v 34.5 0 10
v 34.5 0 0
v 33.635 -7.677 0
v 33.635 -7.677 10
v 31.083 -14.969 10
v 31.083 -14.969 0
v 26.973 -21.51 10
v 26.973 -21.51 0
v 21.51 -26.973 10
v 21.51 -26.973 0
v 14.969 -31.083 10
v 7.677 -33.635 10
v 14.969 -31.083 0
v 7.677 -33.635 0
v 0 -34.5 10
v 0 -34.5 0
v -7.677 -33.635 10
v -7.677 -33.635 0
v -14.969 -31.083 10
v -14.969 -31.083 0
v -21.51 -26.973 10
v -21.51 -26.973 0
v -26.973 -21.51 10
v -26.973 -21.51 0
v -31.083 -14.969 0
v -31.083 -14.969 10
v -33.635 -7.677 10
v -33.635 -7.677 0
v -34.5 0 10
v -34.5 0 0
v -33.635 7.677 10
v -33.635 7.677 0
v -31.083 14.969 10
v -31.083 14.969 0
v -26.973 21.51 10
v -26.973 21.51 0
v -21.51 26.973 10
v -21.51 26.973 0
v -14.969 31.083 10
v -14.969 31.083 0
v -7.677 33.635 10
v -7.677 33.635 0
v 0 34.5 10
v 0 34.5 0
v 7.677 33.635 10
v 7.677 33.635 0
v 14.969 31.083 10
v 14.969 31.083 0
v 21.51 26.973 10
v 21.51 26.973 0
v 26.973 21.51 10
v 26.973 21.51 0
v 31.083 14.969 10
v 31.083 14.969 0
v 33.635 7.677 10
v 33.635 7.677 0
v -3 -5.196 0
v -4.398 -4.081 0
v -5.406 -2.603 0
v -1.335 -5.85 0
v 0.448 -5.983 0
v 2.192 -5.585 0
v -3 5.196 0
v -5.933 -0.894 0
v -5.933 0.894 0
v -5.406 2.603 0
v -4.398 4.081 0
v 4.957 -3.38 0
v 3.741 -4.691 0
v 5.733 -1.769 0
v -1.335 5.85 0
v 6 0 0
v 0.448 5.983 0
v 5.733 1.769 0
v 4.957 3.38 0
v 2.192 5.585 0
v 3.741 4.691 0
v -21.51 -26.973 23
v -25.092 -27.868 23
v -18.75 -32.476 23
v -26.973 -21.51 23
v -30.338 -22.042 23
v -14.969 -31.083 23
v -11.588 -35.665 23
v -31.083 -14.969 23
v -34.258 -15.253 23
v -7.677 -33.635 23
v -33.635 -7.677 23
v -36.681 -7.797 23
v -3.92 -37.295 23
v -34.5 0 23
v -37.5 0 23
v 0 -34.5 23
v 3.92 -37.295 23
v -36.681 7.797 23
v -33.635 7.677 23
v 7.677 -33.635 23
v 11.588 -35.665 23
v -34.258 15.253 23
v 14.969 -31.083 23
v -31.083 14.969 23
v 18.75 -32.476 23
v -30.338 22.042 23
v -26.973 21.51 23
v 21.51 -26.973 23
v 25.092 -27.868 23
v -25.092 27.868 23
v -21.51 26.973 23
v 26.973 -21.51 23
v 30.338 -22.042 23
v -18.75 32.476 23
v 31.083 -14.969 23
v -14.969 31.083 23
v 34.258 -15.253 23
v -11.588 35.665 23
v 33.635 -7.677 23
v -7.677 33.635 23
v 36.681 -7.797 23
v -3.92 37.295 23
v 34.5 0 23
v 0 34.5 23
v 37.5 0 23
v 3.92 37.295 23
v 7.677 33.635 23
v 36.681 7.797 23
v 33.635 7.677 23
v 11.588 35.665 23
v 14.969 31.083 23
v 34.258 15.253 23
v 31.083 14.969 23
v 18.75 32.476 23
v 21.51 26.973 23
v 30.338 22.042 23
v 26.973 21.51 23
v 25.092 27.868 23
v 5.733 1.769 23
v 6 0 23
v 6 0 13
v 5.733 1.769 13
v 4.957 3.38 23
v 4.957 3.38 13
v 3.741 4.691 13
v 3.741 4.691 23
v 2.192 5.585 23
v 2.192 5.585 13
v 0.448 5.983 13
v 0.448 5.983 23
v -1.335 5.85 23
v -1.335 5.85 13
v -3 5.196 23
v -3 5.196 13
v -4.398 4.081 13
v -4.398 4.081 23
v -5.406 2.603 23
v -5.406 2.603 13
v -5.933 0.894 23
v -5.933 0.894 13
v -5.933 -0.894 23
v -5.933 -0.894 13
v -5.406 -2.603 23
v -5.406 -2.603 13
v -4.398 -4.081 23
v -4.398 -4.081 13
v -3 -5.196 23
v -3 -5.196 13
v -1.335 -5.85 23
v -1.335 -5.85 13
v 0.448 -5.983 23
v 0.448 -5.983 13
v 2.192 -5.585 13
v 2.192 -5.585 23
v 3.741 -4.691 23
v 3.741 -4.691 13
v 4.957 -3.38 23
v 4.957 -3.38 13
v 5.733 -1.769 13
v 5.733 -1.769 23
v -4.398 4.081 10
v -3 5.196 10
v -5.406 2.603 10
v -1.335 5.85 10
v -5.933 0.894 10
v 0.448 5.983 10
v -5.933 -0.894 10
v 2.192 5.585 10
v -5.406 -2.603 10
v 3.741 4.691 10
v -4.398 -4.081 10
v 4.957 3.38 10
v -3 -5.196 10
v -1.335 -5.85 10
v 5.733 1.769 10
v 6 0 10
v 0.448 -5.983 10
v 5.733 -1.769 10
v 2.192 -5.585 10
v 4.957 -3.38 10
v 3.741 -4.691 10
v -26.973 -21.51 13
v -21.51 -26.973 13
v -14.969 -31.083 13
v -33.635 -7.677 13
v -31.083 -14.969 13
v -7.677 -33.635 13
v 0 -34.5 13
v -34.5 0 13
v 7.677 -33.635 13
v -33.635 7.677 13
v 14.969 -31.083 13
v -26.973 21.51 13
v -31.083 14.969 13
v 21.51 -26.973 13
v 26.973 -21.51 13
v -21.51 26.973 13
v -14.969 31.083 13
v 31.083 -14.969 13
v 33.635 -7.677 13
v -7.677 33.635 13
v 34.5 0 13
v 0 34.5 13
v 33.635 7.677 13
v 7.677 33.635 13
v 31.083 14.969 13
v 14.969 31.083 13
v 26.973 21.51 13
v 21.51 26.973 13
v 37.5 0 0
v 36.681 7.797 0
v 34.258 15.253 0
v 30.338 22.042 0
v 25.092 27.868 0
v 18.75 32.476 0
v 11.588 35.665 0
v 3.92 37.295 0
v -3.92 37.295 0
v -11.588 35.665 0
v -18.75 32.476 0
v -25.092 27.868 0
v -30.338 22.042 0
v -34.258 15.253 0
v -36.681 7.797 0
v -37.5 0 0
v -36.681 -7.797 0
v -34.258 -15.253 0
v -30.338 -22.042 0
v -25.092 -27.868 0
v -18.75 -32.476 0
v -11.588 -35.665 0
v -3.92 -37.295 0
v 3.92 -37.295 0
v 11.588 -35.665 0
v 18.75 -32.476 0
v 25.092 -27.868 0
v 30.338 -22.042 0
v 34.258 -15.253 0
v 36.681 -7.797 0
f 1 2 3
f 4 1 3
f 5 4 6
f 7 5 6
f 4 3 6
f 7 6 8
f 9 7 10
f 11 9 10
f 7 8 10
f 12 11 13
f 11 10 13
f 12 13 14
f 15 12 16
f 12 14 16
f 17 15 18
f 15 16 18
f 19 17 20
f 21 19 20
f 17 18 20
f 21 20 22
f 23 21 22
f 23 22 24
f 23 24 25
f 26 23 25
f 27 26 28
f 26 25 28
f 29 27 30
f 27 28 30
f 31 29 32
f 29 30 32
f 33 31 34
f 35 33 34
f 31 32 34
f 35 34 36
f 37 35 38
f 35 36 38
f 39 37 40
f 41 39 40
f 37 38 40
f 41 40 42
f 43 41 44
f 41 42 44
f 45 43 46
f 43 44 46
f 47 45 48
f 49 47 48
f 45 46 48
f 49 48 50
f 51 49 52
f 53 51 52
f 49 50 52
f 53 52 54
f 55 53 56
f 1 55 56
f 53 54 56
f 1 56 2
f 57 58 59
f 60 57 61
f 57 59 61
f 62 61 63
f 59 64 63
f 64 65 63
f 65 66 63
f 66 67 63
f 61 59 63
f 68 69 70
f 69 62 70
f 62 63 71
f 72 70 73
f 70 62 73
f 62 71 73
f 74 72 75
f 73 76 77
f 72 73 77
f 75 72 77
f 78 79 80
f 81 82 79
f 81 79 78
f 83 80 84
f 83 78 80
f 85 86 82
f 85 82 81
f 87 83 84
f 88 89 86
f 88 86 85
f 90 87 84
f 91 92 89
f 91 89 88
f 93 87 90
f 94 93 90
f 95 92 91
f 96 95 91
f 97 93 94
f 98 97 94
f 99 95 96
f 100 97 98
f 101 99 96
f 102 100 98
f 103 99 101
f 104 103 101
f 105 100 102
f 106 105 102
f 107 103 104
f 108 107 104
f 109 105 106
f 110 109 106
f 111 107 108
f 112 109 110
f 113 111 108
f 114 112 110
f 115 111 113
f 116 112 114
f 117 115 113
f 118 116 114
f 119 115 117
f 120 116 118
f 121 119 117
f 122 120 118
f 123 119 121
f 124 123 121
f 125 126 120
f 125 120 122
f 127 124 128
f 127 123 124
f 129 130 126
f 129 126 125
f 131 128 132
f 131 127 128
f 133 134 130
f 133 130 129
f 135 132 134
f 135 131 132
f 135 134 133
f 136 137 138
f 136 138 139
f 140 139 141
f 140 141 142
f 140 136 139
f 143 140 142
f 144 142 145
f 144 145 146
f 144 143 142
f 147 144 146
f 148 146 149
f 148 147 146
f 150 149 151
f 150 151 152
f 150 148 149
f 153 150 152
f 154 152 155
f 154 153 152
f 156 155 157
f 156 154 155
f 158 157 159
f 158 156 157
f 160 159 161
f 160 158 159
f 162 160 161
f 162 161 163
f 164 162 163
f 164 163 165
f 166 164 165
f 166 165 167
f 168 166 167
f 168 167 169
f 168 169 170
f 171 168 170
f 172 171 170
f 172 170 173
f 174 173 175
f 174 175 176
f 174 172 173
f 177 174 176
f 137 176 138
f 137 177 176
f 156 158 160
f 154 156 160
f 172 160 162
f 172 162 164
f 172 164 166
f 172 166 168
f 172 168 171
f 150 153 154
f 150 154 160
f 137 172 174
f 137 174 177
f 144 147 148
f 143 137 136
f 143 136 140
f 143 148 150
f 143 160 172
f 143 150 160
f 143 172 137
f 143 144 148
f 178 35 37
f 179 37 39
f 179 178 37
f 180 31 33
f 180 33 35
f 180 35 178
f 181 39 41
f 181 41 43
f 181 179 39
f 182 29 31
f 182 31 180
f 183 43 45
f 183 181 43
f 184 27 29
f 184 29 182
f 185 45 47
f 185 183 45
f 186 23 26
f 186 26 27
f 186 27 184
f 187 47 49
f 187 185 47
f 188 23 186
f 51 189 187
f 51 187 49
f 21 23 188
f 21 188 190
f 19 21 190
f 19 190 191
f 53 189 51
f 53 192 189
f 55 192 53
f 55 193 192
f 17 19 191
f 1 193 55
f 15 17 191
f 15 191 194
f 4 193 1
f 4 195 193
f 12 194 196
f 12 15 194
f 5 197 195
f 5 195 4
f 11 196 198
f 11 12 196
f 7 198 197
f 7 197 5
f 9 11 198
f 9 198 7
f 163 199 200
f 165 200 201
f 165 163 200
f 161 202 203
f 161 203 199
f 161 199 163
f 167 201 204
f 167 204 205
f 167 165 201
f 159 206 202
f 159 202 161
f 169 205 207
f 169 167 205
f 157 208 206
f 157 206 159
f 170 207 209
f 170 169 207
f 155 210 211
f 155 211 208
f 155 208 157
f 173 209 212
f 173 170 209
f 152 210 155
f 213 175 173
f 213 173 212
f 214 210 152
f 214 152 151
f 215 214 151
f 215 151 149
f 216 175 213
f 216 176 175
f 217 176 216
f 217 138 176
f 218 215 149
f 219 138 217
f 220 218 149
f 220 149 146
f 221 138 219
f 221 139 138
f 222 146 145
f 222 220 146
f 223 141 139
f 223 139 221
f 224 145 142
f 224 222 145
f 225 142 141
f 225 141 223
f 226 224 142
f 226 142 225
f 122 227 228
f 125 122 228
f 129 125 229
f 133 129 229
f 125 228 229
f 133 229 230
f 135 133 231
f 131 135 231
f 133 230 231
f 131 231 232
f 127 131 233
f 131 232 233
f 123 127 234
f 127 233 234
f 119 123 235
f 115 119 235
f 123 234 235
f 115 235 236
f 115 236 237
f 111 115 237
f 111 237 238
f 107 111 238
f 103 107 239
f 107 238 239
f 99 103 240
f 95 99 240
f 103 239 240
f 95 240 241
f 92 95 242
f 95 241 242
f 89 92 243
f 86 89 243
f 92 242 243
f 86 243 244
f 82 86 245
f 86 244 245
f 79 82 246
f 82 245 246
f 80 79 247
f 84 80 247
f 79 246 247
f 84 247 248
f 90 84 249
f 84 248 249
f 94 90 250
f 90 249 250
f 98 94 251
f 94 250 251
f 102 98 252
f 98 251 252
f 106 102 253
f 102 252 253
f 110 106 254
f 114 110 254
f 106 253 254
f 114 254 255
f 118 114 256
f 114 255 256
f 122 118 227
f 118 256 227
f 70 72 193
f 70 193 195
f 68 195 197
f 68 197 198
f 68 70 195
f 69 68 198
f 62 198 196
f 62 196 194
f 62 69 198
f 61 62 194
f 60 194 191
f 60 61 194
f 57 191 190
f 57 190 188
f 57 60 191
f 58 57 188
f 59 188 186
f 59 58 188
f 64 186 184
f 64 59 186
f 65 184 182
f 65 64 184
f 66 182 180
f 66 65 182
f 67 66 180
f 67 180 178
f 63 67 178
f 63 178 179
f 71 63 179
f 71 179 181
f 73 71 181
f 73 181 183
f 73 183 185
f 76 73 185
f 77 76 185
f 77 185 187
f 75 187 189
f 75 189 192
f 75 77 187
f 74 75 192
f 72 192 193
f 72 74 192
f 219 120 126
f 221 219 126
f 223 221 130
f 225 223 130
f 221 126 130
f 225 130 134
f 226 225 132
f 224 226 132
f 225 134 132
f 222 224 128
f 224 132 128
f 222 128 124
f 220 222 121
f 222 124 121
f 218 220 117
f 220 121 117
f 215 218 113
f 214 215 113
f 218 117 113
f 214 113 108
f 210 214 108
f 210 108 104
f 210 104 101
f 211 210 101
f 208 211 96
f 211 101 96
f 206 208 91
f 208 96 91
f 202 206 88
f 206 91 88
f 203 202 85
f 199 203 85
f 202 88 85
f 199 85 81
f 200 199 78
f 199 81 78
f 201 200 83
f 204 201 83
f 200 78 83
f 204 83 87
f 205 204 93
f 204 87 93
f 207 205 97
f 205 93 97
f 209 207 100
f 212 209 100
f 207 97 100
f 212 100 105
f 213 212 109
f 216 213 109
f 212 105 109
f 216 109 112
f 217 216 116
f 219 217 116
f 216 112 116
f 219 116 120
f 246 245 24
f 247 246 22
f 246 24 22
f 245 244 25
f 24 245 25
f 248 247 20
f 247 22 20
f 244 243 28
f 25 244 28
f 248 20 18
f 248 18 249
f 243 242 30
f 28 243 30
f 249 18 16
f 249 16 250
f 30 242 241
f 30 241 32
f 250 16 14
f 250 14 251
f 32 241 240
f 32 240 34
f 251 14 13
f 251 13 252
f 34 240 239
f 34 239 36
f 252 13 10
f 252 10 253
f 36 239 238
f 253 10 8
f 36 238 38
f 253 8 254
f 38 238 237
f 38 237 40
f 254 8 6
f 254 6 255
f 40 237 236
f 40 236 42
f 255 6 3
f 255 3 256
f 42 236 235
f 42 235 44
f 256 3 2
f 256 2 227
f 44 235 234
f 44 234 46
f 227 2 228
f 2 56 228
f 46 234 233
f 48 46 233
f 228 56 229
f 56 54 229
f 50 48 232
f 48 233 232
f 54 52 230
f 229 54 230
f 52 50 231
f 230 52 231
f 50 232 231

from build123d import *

# Parameters (mm, degrees)
F0_R     = 37.5
F1_DEPTH = 23
F2_R     = 34.5
F2_R_2   = 6
F3_DEPTH = 10
F4_R     = 34.5
F4_R_2   = 6
F5_DEPTH = 10


with BuildPart() as f1:
    # F0 (on Top) → F1 (new body)
    with BuildSketch(Plane.XY):
        Circle(F0_R)
    extrude(amount=F1_DEPTH)

    # F2 (on face) → F3 (cut)
    with BuildSketch(Plane.XY.offset(23)):
        Circle(F2_R)
        Circle(F2_R_2, mode=Mode.SUBTRACT)
    extrude(amount=-F3_DEPTH, mode=Mode.SUBTRACT)

    # F4 (on face) → F5 (cut)
    with BuildSketch(Plane(origin=(0, 0, 0), x_dir=(1, 0, 0), z_dir=(0, 0, -1))):
        Circle(F4_R)
        Circle(F4_R_2, mode=Mode.SUBTRACT)
    extrude(amount=-F5_DEPTH, mode=Mode.SUBTRACT)


solid = f1.part
